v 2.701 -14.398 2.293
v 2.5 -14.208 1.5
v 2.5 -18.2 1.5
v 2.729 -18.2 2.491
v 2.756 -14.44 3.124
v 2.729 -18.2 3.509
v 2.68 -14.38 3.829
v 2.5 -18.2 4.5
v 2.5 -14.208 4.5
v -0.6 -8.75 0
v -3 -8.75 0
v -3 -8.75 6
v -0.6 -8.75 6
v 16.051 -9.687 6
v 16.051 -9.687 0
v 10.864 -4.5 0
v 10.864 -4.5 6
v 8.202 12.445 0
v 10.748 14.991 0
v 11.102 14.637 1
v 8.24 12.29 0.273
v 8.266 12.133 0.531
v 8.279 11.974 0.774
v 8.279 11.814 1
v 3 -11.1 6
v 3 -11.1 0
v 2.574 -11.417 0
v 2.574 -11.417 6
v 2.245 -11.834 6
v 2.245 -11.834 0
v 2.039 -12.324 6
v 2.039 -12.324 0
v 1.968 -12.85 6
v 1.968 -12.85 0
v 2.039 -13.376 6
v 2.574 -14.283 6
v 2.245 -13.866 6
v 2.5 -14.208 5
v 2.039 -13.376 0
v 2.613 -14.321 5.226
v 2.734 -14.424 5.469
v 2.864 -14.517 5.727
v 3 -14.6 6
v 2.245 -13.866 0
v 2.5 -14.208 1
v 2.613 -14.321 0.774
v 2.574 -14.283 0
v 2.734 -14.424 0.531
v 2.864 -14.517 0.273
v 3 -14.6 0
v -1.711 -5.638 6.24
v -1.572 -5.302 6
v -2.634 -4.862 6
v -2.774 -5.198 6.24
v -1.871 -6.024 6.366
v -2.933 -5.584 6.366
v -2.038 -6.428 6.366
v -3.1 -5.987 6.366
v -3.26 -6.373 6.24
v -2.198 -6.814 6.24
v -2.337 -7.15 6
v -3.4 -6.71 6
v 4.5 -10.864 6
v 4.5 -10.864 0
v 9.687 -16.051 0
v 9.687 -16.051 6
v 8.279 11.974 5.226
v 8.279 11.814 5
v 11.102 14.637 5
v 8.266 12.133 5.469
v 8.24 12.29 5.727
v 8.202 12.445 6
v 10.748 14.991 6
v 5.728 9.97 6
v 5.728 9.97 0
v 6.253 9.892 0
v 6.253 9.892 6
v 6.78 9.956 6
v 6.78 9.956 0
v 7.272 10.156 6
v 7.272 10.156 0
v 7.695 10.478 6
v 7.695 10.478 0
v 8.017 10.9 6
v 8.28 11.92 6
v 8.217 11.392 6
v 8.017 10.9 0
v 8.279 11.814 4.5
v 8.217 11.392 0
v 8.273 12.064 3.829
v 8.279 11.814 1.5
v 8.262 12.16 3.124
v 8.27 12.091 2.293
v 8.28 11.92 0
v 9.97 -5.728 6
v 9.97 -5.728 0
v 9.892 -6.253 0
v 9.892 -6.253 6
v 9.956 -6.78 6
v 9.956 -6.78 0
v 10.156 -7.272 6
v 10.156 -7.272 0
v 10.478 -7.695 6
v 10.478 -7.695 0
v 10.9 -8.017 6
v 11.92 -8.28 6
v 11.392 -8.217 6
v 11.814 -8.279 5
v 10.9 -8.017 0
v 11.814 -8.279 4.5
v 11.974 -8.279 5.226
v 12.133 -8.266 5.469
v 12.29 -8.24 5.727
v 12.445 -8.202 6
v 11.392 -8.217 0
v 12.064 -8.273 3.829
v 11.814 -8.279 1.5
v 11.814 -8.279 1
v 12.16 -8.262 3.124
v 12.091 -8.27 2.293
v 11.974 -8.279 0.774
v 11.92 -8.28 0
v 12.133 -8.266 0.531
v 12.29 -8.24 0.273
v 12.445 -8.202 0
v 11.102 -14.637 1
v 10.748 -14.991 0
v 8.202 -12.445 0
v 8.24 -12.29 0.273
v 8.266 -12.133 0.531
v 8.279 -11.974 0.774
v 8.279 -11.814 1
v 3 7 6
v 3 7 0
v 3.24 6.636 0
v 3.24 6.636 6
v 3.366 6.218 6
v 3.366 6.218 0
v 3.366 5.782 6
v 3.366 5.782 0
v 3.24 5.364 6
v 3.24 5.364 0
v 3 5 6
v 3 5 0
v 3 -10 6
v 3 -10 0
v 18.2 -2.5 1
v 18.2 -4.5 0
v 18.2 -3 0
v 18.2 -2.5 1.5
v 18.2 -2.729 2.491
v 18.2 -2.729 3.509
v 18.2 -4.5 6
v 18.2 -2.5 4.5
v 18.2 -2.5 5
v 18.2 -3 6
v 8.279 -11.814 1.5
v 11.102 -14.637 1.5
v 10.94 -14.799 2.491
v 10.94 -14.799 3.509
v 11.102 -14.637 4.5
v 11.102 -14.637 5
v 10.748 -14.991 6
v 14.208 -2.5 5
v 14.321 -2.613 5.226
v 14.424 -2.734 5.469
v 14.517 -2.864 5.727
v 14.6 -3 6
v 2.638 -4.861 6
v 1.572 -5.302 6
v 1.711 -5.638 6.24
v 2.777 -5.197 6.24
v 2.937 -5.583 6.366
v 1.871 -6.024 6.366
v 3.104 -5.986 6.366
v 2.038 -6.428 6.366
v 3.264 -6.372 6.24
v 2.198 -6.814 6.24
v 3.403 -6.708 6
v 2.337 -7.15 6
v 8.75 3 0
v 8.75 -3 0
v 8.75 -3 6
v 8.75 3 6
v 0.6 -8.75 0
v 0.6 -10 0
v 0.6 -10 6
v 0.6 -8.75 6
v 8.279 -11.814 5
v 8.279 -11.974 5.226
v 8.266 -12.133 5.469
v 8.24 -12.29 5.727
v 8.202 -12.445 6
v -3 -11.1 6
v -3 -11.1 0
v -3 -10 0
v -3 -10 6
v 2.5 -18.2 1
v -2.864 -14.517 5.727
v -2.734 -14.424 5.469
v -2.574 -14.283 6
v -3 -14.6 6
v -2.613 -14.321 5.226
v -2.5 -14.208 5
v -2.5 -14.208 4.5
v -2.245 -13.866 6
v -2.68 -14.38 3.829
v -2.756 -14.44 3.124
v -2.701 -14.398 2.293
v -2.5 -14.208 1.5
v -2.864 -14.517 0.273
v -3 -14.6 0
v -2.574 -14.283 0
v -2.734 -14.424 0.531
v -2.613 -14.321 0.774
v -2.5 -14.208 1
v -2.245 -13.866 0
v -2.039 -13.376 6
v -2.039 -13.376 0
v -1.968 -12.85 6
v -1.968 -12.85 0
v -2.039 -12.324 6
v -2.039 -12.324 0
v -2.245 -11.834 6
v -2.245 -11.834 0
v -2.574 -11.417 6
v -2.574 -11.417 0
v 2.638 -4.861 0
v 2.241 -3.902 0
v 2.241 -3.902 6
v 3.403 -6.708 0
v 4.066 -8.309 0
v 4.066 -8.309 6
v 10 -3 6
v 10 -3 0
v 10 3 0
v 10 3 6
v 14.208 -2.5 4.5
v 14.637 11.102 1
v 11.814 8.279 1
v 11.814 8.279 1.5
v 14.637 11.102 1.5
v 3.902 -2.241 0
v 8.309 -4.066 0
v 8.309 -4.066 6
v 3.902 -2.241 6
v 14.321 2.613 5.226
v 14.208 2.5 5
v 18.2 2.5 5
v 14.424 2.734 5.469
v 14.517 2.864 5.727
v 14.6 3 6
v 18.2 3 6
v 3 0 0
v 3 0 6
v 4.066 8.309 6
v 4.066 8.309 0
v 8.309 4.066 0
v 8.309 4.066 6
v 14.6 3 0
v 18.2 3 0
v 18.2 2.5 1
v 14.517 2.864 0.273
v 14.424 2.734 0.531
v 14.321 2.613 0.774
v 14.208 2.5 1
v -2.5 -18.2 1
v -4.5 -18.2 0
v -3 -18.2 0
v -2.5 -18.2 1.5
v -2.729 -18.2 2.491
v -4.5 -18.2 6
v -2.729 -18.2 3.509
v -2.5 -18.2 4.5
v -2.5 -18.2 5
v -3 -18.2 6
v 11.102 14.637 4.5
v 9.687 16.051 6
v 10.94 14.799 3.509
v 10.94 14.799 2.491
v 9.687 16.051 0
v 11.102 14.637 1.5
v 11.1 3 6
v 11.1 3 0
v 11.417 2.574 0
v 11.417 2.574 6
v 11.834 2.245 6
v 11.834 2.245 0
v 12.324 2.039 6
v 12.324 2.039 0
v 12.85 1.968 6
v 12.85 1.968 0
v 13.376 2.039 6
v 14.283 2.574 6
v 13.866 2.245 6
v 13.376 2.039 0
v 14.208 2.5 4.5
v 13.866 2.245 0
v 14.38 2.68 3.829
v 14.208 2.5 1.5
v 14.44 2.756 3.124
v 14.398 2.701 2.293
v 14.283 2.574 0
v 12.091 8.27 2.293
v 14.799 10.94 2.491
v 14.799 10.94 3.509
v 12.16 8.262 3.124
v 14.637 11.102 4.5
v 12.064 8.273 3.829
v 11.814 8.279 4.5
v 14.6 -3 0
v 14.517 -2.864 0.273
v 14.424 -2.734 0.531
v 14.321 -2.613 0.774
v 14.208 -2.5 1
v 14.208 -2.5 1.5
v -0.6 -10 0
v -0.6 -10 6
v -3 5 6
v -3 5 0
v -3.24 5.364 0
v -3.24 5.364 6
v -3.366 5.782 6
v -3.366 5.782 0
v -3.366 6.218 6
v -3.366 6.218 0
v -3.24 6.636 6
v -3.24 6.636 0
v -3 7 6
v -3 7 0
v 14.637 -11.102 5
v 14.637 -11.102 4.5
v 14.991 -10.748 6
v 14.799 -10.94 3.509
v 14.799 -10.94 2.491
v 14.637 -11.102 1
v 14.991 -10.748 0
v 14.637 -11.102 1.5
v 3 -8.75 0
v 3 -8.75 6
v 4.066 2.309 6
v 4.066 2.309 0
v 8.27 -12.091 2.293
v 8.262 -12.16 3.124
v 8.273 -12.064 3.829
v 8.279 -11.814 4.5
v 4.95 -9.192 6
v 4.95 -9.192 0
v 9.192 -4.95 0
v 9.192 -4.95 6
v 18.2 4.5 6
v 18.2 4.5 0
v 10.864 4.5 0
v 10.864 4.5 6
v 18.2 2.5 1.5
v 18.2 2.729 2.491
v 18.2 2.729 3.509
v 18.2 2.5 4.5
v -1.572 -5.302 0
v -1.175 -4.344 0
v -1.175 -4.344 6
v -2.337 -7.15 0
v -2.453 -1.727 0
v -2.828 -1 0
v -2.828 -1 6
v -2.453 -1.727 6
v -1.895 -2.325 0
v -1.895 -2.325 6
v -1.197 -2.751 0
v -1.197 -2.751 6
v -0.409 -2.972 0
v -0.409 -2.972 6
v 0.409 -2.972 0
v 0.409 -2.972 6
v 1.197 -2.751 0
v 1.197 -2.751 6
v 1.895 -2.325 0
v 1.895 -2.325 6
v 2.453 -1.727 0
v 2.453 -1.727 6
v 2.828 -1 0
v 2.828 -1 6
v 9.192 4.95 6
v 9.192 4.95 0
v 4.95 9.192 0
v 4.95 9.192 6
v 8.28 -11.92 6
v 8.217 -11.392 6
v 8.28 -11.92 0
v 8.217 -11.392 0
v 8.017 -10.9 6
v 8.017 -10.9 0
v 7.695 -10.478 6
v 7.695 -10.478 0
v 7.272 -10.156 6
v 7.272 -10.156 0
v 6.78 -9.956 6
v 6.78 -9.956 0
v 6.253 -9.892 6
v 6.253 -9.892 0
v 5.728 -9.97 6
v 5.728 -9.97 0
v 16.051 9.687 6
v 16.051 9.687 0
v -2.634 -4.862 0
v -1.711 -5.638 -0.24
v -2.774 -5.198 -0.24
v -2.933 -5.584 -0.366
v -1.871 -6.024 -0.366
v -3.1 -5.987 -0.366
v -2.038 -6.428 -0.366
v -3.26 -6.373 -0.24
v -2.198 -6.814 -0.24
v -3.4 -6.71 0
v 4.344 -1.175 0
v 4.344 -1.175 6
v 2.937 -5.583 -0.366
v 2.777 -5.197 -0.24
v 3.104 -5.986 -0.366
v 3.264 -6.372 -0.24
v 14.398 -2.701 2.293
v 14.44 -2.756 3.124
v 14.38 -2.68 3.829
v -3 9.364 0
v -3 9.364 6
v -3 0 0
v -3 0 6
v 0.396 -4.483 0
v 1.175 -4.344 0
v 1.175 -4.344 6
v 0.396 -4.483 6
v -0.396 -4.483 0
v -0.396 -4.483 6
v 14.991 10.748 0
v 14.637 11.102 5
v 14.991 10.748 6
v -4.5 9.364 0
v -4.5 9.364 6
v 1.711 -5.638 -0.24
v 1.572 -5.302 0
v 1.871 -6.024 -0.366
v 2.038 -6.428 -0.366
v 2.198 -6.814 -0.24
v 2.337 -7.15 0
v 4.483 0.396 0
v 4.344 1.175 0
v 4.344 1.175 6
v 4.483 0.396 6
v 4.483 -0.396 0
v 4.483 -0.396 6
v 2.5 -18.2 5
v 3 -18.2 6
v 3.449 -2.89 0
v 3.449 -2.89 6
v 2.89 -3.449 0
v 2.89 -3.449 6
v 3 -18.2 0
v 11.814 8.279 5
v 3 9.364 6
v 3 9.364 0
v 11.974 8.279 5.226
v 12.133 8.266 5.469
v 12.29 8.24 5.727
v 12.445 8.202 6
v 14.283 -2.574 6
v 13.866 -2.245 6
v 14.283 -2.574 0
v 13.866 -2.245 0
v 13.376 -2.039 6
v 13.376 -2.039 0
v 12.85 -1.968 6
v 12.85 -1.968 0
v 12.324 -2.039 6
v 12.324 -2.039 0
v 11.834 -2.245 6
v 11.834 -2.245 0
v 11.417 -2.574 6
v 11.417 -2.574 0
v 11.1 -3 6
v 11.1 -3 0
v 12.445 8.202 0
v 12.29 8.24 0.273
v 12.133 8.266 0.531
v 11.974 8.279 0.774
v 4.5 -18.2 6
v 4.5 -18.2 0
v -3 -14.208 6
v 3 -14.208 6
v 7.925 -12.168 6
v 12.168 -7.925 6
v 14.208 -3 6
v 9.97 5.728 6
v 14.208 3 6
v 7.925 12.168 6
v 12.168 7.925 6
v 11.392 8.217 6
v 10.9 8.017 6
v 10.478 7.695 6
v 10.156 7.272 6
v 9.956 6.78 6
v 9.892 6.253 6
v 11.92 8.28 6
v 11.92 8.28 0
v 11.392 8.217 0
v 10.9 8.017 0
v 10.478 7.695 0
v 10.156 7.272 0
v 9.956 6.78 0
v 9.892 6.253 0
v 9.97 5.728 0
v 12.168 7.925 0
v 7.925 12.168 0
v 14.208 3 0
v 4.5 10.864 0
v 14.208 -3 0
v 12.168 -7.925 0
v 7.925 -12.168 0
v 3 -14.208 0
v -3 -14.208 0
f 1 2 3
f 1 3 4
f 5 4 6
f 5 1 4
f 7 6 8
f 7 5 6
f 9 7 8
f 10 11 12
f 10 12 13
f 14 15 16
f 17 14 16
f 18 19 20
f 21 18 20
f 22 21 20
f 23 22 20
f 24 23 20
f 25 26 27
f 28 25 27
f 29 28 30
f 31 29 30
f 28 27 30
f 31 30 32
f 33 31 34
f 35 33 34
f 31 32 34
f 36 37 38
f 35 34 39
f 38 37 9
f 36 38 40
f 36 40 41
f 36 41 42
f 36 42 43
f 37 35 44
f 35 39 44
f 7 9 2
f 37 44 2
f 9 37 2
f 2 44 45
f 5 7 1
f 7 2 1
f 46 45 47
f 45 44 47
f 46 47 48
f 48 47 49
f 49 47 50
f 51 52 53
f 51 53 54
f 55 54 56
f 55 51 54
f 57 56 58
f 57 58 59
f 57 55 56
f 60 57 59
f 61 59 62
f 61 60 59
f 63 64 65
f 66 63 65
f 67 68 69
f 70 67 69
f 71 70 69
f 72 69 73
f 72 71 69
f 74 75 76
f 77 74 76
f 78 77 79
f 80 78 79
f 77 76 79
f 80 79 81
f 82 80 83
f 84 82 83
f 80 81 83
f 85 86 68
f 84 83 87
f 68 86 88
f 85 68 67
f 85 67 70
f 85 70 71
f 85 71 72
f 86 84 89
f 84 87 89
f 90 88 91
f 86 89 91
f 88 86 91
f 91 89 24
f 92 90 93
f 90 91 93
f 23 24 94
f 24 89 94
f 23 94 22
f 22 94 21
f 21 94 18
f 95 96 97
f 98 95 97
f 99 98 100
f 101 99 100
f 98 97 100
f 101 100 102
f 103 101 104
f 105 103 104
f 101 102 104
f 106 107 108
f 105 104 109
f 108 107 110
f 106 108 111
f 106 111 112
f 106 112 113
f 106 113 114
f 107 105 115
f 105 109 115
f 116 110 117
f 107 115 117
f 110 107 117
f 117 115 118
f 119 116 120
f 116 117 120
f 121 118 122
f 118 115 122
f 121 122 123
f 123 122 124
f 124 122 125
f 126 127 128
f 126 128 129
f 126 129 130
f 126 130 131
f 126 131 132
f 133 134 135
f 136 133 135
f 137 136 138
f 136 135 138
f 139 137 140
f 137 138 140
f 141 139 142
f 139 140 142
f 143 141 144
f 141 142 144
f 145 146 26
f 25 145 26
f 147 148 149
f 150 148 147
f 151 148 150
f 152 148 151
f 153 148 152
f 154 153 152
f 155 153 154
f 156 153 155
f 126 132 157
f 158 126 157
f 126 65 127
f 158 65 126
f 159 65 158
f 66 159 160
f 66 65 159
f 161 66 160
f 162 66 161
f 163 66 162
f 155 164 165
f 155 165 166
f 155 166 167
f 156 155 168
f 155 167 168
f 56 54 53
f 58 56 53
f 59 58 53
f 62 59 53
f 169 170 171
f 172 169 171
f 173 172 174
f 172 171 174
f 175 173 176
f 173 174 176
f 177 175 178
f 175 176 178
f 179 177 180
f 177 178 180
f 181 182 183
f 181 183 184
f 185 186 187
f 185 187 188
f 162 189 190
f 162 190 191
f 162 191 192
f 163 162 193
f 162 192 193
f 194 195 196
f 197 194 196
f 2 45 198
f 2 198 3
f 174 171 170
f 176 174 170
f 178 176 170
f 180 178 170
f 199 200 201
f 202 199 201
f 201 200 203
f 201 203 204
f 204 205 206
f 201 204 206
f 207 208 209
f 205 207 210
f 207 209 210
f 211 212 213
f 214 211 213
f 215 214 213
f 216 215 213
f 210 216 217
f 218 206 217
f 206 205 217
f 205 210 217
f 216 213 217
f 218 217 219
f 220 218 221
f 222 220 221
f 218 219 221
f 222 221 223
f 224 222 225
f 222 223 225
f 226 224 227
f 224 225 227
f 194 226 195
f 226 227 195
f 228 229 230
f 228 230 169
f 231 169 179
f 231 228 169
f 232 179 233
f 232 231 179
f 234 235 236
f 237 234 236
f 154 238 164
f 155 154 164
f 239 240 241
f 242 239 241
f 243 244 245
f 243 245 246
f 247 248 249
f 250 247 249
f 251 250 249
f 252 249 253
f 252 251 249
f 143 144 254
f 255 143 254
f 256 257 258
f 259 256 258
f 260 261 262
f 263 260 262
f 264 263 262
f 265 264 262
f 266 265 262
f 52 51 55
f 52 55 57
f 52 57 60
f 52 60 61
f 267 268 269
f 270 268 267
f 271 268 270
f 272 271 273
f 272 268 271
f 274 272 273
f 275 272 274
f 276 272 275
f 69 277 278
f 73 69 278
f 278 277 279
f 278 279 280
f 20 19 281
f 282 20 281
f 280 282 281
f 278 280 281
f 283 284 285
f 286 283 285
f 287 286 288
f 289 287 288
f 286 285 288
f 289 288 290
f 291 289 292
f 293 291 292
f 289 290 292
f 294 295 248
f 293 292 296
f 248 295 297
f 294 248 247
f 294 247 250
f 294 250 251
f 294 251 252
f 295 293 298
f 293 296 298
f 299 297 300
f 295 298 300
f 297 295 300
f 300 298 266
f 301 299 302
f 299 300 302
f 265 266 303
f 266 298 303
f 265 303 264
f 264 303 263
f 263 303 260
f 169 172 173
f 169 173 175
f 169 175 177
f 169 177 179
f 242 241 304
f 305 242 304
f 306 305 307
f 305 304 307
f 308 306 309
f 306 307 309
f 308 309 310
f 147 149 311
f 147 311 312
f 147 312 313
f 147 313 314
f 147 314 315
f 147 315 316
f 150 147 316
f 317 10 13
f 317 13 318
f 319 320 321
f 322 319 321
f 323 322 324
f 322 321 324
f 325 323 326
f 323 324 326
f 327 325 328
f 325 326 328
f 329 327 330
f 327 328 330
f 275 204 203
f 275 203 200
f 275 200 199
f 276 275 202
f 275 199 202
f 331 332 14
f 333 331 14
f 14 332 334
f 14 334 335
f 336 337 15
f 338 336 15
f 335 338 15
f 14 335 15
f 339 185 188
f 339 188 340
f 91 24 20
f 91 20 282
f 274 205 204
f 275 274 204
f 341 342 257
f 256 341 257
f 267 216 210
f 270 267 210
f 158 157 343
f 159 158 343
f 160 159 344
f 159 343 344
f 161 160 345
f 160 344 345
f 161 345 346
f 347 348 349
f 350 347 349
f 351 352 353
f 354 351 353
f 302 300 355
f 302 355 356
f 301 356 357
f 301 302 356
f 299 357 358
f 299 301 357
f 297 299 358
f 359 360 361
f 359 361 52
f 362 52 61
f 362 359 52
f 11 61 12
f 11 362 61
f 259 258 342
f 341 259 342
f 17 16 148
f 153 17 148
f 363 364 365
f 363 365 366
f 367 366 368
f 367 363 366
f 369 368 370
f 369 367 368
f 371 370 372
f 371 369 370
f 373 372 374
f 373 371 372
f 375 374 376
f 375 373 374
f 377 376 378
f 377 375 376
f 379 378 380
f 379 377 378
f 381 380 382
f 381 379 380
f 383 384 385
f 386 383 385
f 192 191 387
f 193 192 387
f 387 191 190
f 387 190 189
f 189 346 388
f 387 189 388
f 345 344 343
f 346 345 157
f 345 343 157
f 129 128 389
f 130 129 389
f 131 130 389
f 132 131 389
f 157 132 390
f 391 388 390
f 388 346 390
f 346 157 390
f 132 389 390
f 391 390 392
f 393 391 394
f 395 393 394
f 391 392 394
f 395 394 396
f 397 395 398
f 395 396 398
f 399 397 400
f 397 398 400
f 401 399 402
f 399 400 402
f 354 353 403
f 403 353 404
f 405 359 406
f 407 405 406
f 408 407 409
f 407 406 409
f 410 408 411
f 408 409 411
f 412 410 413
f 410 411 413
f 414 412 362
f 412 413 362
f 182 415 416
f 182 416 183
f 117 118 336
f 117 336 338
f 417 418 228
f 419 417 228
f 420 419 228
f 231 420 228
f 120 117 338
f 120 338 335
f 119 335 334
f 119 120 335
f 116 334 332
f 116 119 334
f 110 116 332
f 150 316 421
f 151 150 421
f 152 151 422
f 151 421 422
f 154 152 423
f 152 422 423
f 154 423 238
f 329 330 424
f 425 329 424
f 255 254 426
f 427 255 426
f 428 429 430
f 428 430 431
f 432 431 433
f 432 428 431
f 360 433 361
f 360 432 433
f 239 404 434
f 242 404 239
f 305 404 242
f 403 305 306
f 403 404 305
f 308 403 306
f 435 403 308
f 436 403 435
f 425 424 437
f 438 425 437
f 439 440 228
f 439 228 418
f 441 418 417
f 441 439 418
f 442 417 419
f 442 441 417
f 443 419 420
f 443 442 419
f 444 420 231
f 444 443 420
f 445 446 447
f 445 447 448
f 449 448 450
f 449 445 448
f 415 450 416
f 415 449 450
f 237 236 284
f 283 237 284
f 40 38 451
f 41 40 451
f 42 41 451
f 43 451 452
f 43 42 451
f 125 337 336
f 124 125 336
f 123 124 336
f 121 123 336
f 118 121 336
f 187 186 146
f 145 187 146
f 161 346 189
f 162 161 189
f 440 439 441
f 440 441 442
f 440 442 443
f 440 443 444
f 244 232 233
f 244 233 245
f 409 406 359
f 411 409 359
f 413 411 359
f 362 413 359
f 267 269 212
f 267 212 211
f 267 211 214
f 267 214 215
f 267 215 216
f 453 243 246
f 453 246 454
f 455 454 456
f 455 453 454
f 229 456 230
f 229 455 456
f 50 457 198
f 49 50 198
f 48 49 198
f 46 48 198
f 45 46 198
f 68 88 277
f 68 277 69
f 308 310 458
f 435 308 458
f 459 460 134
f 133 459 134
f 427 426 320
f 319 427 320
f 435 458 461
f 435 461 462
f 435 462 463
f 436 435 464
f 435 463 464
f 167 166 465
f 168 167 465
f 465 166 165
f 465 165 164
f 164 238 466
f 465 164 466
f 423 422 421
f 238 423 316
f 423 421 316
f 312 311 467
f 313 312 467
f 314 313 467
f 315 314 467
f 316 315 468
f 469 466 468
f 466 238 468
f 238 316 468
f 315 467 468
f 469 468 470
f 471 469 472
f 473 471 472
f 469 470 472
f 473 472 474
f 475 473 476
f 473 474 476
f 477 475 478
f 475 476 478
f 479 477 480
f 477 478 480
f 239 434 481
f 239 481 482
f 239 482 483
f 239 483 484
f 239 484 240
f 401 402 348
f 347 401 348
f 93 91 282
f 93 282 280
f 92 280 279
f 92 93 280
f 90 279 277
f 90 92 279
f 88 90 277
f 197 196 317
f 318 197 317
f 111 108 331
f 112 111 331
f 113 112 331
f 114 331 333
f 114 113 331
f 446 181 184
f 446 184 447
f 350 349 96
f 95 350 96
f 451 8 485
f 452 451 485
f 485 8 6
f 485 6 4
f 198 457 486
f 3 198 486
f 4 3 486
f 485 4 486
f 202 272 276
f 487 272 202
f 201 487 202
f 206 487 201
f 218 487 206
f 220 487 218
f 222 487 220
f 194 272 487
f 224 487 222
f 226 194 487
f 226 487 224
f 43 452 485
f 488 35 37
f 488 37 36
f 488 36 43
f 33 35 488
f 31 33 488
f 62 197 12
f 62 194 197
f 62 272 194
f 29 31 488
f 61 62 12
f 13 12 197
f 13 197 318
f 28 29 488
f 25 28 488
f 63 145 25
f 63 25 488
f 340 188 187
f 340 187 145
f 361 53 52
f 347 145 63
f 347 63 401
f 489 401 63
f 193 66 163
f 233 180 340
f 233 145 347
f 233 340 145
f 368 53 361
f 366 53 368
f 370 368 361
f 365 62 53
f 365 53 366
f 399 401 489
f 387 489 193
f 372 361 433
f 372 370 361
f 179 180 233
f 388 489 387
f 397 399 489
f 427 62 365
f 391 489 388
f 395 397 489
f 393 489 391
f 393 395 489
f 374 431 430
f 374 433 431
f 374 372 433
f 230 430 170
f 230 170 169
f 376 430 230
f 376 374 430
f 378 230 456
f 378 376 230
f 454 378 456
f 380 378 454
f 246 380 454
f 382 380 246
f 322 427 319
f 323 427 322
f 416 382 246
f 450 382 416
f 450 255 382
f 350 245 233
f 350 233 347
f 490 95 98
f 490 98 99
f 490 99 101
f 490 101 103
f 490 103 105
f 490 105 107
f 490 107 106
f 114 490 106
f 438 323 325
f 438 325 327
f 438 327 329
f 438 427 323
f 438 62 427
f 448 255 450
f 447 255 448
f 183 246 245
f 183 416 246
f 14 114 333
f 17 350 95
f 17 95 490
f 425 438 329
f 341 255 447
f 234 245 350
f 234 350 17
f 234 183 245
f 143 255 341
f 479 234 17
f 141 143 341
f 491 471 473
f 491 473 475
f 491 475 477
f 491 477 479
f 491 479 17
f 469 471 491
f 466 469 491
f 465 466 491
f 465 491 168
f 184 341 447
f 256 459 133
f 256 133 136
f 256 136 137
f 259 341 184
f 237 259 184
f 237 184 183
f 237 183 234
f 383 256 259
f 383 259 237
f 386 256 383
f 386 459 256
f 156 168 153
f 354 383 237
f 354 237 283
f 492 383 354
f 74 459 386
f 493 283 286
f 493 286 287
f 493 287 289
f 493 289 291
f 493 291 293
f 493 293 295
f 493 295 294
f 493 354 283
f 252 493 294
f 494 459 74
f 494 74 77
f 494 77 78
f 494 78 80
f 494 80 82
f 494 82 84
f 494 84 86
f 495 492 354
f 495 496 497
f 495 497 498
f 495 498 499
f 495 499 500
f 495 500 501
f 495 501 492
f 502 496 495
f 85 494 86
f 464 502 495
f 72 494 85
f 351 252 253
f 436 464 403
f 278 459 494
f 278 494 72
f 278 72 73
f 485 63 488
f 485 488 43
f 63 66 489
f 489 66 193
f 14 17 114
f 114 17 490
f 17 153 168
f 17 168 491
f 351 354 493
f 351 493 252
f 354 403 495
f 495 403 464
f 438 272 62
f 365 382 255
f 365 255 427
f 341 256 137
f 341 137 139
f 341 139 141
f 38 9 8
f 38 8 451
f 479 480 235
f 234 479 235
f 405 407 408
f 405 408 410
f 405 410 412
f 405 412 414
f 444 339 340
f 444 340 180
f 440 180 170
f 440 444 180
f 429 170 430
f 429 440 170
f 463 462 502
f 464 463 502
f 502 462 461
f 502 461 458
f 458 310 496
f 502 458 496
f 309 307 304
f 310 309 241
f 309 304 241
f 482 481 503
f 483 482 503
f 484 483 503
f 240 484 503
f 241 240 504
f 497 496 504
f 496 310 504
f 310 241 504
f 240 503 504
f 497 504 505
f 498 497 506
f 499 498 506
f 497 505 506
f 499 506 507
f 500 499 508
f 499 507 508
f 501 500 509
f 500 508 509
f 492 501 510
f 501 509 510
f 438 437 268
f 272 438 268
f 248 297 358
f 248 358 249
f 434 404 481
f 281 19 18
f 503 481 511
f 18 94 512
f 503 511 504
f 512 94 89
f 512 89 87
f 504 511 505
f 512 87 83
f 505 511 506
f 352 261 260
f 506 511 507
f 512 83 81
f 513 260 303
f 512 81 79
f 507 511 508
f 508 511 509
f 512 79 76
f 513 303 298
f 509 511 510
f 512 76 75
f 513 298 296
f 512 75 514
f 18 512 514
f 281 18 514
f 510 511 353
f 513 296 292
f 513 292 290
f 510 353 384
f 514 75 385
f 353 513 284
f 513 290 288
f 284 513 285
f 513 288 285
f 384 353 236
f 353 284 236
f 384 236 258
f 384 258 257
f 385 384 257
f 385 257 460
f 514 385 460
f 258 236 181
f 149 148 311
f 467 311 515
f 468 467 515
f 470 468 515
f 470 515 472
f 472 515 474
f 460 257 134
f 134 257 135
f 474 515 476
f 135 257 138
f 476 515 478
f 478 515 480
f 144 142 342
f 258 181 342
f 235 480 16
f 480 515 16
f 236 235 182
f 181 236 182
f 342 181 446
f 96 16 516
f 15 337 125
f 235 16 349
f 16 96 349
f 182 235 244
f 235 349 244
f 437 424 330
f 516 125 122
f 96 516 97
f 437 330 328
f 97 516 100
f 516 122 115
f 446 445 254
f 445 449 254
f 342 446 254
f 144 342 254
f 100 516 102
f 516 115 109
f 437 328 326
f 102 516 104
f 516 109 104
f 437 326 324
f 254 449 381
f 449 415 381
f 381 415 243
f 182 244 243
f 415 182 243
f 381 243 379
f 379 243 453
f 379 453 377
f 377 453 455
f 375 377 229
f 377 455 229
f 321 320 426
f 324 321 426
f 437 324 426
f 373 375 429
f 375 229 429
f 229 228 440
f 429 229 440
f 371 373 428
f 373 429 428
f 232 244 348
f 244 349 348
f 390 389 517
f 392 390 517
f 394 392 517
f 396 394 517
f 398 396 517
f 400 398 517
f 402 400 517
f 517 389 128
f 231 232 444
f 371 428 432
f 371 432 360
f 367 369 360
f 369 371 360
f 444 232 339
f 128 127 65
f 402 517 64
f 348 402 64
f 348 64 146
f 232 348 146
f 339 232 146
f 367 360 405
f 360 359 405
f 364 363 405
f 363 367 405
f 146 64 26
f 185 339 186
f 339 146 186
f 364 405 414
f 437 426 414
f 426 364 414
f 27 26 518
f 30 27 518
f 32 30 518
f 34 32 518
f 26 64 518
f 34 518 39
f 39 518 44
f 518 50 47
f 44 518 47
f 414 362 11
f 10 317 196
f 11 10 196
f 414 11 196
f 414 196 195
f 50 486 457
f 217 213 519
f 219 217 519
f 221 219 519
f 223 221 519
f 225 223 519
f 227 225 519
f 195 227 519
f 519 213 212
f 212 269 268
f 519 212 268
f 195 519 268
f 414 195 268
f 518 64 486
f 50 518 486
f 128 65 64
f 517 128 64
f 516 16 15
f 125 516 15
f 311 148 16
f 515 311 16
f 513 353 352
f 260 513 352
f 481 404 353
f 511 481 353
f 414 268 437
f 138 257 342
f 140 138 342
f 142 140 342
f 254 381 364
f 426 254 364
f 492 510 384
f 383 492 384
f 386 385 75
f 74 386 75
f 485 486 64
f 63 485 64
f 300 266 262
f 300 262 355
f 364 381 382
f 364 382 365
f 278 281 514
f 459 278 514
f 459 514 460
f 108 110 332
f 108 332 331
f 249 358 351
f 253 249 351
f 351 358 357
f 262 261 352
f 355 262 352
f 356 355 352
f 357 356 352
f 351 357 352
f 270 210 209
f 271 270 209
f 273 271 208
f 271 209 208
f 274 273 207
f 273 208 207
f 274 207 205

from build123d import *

# Parameters (mm, degrees)
EXTRUDE_1_DEPTH          = 6
EXTRUDE_START            = -3.991967
EXTRUDE_2_DEPTH          = 3.991967
PATTERN_CIRCULAR_1_COUNT = 5
PATTERN_CIRCULAR_1_ANGLE = 180
CUT_EXTRUDE_1_DEPTH      = 7.0000001
EXTRUDE_3_DEPTH          = 1.153683
EXTRUDE_4_DEPTH          = 1.15


with BuildPart() as part:
    # 草图1 → 凸台-拉伸1 (new body)
    with BuildSketch(Plane.XY):
        with BuildLine():
            Line((-4.5, 0), (-4.5, -18.2))
            Line((-4.5, -18.2), (-3, -18.2))
            Line((-3, -18.2), (-3, -14.6))
            ThreePointArc((-3, -14.6), (-1.968245837, -12.85), (-3, -11.1))
            Line((-3, -11.1), (-3, -10))
            Line((-3, -10), (3, -10))
            Line((3, -10), (3, -11.1))
            ThreePointArc((3, -11.1), (1.968245837, -12.85), (3, -14.6))
            Line((3, -14.6), (3, -18.2))
            Line((3, -18.2), (4.5, -18.2))
            Line((4.5, -18.2), (4.5, 0))
            ThreePointArc((4.5, 0), (0, 4.5), (-4.5, 0))
        make_face()
    extrude_1 = extrude(amount=EXTRUDE_1_DEPTH)

    # 草图3 → 凸台-拉伸2 (add)
    with BuildSketch(Plane.XZ.offset(18.2).offset(EXTRUDE_START)):
        with BuildLine():
            Line((-3, 6), (-3, 0))
            Line((-3, 0), (-2.5, 1))
            Line((-2.5, 1), (-2.5, 1.5))
            ThreePointArc((-2.5, 1.5), (-2.757359313, 3), (-2.5, 4.5))
            Line((-2.5, 4.5), (-2.5, 5))
            Line((-2.5, 5), (-3, 6))
        make_face()
        with BuildLine():
            Line((3, 0), (2.5, 1))
            Line((2.5, 1), (2.5, 1.5))
            ThreePointArc((2.5, 1.5), (2.757359313, 3), (2.5, 4.5))
            Line((2.5, 4.5), (2.5, 5))
            Line((2.5, 5), (3, 6))
            Line((3, 6), (3, 0))
        make_face()
    extrude_2 = extrude(amount=EXTRUDE_2_DEPTH)

    # 阵列(圆周)1: 凸台-拉伸1, 凸台-拉伸2 ×5 about axis
    pattern_circular_1_axis = Axis((0, 0, 0), (0, 0, 1))
    for i in range(1, PATTERN_CIRCULAR_1_COUNT):
        add(extrude_1.rotate(pattern_circular_1_axis, i * PATTERN_CIRCULAR_1_ANGLE / (PATTERN_CIRCULAR_1_COUNT - 1)))
        add(extrude_2.rotate(pattern_circular_1_axis, i * PATTERN_CIRCULAR_1_ANGLE / (PATTERN_CIRCULAR_1_COUNT - 1)))

    # 草图4 → 切除-拉伸1 (cut, through all)
    with BuildSketch(Plane(origin=(0, 0, 0), x_dir=(-1, 0, 0), z_dir=(0, 0, -1))):
        with BuildLine():
            Line((-3, -8.75), (-1.174936357, -4.343906601))
            ThreePointArc((-1.174936357, -4.343906601), (0, -4.5), (1.174936357, -4.343906601))
            Line((1.174936357, -4.343906601), (3, -8.75))
            Line((3, -8.75), (0.6, -8.75))
            Line((0.6, -8.75), (0.6, -10))
            Line((0.6, -10), (-0.6, -10))
            Line((-0.6, -10), (-0.6, -8.75))
            Line((-0.6, -8.75), (-3, -8.75))
        make_face()
        with BuildLine():
            Line((-4.065863992, -8.308504679), (-8.308504679, -4.065863992))
            Line((-8.308504679, -4.065863992), (-3.90241128, -2.240800349))
            ThreePointArc((-3.90241128, -2.240800349), (-3.181980515, -3.181980515), (-2.240800349, -3.90241128))
            Line((-2.240800349, -3.90241128), (-4.065863992, -8.308504679))
        make_face()
        with BuildLine():
            Line((-8.75, 3), (-4.343906601, 1.174936357))
            ThreePointArc((-4.343906601, 1.174936357), (-4.5, 0), (-4.343906601, -1.174936357))
            Line((-4.343906601, -1.174936357), (-8.75, -3))
            Line((-8.75, -3), (-8.75, 3))
        make_face()
        Polygon((-8.308504679, 4.065863992), (-4.065863992, 2.308504679), (-4.065863992, 8.308504679), align=None)
        with BuildLine():
            Line((-4.5, 10.863961031), (-3, 9.363961031))
            Line((-3, 9.363961031), (-3, 7))
            ThreePointArc((-3, 7), (-3.381966011, 6), (-3, 5))
            Line((-3, 5), (-3, 0))
            Line((-3, 0), (0, 0))
            Line((0, 0), (3, 0))
            Line((3, 0), (3, 5))
            ThreePointArc((3, 5), (3.381966011, 6), (3, 7))
            Line((3, 7), (3, 9.363961031))
            Line((3, 9.363961031), (4.5, 9.363961031))
            Line((4.5, 9.363961031), (4.5, 18.2))
            Line((4.5, 18.2), (-4.5, 18.2))
            Line((-4.5, 18.2), (-4.5, 10.863961031))
        make_face()
        with BuildLine():
            Line((-2.828427125, -1), (2.828427125, -1))
            ThreePointArc((2.828427125, -1), (0, -3), (-2.828427125, -1))
        make_face()
    extrude(amount=-CUT_EXTRUDE_1_DEPTH, mode=Mode.SUBTRACT)

    # 草图5 → 凸台-拉伸3 (add)
    with BuildSketch(Plane(origin=(-0.532931996, -0.220747661, 0), x_dir=(0, 0, 1), z_dir=(-0.923879533, -0.382683432, 0))):
        with BuildLine():
            Line((0, -7.5), (0, -5.5))
            ThreePointArc((0, -5.5), (-0.381966011, -6.5), (0, -7.5))
        make_face()
        with BuildLine():
            Line((6, -7.5), (6, -5.5))
            ThreePointArc((6, -5.5), (6.381966011, -6.5), (6, -7.5))
        make_face()
    extrude(amount=-EXTRUDE_3_DEPTH)

    # 草图7 → 凸台-拉伸4 (add)
    with BuildSketch(Plane(origin=(0.532931996, -0.220747661, 0), x_dir=(0, 0, -1), z_dir=(0.923879533, -0.382683432, 0))):
        with BuildLine():
            Line((0, -7.5), (0, -5.5))
            ThreePointArc((0, -5.5), (0.381966011, -6.5), (0, -7.5))
        make_face()
        with BuildLine():
            Line((-6, -7.5), (-6, -5.5))
            ThreePointArc((-6, -5.5), (-6.381966011, -6.5), (-6, -7.5))
        make_face()
    extrude(amount=-EXTRUDE_4_DEPTH)


solid = part.part
